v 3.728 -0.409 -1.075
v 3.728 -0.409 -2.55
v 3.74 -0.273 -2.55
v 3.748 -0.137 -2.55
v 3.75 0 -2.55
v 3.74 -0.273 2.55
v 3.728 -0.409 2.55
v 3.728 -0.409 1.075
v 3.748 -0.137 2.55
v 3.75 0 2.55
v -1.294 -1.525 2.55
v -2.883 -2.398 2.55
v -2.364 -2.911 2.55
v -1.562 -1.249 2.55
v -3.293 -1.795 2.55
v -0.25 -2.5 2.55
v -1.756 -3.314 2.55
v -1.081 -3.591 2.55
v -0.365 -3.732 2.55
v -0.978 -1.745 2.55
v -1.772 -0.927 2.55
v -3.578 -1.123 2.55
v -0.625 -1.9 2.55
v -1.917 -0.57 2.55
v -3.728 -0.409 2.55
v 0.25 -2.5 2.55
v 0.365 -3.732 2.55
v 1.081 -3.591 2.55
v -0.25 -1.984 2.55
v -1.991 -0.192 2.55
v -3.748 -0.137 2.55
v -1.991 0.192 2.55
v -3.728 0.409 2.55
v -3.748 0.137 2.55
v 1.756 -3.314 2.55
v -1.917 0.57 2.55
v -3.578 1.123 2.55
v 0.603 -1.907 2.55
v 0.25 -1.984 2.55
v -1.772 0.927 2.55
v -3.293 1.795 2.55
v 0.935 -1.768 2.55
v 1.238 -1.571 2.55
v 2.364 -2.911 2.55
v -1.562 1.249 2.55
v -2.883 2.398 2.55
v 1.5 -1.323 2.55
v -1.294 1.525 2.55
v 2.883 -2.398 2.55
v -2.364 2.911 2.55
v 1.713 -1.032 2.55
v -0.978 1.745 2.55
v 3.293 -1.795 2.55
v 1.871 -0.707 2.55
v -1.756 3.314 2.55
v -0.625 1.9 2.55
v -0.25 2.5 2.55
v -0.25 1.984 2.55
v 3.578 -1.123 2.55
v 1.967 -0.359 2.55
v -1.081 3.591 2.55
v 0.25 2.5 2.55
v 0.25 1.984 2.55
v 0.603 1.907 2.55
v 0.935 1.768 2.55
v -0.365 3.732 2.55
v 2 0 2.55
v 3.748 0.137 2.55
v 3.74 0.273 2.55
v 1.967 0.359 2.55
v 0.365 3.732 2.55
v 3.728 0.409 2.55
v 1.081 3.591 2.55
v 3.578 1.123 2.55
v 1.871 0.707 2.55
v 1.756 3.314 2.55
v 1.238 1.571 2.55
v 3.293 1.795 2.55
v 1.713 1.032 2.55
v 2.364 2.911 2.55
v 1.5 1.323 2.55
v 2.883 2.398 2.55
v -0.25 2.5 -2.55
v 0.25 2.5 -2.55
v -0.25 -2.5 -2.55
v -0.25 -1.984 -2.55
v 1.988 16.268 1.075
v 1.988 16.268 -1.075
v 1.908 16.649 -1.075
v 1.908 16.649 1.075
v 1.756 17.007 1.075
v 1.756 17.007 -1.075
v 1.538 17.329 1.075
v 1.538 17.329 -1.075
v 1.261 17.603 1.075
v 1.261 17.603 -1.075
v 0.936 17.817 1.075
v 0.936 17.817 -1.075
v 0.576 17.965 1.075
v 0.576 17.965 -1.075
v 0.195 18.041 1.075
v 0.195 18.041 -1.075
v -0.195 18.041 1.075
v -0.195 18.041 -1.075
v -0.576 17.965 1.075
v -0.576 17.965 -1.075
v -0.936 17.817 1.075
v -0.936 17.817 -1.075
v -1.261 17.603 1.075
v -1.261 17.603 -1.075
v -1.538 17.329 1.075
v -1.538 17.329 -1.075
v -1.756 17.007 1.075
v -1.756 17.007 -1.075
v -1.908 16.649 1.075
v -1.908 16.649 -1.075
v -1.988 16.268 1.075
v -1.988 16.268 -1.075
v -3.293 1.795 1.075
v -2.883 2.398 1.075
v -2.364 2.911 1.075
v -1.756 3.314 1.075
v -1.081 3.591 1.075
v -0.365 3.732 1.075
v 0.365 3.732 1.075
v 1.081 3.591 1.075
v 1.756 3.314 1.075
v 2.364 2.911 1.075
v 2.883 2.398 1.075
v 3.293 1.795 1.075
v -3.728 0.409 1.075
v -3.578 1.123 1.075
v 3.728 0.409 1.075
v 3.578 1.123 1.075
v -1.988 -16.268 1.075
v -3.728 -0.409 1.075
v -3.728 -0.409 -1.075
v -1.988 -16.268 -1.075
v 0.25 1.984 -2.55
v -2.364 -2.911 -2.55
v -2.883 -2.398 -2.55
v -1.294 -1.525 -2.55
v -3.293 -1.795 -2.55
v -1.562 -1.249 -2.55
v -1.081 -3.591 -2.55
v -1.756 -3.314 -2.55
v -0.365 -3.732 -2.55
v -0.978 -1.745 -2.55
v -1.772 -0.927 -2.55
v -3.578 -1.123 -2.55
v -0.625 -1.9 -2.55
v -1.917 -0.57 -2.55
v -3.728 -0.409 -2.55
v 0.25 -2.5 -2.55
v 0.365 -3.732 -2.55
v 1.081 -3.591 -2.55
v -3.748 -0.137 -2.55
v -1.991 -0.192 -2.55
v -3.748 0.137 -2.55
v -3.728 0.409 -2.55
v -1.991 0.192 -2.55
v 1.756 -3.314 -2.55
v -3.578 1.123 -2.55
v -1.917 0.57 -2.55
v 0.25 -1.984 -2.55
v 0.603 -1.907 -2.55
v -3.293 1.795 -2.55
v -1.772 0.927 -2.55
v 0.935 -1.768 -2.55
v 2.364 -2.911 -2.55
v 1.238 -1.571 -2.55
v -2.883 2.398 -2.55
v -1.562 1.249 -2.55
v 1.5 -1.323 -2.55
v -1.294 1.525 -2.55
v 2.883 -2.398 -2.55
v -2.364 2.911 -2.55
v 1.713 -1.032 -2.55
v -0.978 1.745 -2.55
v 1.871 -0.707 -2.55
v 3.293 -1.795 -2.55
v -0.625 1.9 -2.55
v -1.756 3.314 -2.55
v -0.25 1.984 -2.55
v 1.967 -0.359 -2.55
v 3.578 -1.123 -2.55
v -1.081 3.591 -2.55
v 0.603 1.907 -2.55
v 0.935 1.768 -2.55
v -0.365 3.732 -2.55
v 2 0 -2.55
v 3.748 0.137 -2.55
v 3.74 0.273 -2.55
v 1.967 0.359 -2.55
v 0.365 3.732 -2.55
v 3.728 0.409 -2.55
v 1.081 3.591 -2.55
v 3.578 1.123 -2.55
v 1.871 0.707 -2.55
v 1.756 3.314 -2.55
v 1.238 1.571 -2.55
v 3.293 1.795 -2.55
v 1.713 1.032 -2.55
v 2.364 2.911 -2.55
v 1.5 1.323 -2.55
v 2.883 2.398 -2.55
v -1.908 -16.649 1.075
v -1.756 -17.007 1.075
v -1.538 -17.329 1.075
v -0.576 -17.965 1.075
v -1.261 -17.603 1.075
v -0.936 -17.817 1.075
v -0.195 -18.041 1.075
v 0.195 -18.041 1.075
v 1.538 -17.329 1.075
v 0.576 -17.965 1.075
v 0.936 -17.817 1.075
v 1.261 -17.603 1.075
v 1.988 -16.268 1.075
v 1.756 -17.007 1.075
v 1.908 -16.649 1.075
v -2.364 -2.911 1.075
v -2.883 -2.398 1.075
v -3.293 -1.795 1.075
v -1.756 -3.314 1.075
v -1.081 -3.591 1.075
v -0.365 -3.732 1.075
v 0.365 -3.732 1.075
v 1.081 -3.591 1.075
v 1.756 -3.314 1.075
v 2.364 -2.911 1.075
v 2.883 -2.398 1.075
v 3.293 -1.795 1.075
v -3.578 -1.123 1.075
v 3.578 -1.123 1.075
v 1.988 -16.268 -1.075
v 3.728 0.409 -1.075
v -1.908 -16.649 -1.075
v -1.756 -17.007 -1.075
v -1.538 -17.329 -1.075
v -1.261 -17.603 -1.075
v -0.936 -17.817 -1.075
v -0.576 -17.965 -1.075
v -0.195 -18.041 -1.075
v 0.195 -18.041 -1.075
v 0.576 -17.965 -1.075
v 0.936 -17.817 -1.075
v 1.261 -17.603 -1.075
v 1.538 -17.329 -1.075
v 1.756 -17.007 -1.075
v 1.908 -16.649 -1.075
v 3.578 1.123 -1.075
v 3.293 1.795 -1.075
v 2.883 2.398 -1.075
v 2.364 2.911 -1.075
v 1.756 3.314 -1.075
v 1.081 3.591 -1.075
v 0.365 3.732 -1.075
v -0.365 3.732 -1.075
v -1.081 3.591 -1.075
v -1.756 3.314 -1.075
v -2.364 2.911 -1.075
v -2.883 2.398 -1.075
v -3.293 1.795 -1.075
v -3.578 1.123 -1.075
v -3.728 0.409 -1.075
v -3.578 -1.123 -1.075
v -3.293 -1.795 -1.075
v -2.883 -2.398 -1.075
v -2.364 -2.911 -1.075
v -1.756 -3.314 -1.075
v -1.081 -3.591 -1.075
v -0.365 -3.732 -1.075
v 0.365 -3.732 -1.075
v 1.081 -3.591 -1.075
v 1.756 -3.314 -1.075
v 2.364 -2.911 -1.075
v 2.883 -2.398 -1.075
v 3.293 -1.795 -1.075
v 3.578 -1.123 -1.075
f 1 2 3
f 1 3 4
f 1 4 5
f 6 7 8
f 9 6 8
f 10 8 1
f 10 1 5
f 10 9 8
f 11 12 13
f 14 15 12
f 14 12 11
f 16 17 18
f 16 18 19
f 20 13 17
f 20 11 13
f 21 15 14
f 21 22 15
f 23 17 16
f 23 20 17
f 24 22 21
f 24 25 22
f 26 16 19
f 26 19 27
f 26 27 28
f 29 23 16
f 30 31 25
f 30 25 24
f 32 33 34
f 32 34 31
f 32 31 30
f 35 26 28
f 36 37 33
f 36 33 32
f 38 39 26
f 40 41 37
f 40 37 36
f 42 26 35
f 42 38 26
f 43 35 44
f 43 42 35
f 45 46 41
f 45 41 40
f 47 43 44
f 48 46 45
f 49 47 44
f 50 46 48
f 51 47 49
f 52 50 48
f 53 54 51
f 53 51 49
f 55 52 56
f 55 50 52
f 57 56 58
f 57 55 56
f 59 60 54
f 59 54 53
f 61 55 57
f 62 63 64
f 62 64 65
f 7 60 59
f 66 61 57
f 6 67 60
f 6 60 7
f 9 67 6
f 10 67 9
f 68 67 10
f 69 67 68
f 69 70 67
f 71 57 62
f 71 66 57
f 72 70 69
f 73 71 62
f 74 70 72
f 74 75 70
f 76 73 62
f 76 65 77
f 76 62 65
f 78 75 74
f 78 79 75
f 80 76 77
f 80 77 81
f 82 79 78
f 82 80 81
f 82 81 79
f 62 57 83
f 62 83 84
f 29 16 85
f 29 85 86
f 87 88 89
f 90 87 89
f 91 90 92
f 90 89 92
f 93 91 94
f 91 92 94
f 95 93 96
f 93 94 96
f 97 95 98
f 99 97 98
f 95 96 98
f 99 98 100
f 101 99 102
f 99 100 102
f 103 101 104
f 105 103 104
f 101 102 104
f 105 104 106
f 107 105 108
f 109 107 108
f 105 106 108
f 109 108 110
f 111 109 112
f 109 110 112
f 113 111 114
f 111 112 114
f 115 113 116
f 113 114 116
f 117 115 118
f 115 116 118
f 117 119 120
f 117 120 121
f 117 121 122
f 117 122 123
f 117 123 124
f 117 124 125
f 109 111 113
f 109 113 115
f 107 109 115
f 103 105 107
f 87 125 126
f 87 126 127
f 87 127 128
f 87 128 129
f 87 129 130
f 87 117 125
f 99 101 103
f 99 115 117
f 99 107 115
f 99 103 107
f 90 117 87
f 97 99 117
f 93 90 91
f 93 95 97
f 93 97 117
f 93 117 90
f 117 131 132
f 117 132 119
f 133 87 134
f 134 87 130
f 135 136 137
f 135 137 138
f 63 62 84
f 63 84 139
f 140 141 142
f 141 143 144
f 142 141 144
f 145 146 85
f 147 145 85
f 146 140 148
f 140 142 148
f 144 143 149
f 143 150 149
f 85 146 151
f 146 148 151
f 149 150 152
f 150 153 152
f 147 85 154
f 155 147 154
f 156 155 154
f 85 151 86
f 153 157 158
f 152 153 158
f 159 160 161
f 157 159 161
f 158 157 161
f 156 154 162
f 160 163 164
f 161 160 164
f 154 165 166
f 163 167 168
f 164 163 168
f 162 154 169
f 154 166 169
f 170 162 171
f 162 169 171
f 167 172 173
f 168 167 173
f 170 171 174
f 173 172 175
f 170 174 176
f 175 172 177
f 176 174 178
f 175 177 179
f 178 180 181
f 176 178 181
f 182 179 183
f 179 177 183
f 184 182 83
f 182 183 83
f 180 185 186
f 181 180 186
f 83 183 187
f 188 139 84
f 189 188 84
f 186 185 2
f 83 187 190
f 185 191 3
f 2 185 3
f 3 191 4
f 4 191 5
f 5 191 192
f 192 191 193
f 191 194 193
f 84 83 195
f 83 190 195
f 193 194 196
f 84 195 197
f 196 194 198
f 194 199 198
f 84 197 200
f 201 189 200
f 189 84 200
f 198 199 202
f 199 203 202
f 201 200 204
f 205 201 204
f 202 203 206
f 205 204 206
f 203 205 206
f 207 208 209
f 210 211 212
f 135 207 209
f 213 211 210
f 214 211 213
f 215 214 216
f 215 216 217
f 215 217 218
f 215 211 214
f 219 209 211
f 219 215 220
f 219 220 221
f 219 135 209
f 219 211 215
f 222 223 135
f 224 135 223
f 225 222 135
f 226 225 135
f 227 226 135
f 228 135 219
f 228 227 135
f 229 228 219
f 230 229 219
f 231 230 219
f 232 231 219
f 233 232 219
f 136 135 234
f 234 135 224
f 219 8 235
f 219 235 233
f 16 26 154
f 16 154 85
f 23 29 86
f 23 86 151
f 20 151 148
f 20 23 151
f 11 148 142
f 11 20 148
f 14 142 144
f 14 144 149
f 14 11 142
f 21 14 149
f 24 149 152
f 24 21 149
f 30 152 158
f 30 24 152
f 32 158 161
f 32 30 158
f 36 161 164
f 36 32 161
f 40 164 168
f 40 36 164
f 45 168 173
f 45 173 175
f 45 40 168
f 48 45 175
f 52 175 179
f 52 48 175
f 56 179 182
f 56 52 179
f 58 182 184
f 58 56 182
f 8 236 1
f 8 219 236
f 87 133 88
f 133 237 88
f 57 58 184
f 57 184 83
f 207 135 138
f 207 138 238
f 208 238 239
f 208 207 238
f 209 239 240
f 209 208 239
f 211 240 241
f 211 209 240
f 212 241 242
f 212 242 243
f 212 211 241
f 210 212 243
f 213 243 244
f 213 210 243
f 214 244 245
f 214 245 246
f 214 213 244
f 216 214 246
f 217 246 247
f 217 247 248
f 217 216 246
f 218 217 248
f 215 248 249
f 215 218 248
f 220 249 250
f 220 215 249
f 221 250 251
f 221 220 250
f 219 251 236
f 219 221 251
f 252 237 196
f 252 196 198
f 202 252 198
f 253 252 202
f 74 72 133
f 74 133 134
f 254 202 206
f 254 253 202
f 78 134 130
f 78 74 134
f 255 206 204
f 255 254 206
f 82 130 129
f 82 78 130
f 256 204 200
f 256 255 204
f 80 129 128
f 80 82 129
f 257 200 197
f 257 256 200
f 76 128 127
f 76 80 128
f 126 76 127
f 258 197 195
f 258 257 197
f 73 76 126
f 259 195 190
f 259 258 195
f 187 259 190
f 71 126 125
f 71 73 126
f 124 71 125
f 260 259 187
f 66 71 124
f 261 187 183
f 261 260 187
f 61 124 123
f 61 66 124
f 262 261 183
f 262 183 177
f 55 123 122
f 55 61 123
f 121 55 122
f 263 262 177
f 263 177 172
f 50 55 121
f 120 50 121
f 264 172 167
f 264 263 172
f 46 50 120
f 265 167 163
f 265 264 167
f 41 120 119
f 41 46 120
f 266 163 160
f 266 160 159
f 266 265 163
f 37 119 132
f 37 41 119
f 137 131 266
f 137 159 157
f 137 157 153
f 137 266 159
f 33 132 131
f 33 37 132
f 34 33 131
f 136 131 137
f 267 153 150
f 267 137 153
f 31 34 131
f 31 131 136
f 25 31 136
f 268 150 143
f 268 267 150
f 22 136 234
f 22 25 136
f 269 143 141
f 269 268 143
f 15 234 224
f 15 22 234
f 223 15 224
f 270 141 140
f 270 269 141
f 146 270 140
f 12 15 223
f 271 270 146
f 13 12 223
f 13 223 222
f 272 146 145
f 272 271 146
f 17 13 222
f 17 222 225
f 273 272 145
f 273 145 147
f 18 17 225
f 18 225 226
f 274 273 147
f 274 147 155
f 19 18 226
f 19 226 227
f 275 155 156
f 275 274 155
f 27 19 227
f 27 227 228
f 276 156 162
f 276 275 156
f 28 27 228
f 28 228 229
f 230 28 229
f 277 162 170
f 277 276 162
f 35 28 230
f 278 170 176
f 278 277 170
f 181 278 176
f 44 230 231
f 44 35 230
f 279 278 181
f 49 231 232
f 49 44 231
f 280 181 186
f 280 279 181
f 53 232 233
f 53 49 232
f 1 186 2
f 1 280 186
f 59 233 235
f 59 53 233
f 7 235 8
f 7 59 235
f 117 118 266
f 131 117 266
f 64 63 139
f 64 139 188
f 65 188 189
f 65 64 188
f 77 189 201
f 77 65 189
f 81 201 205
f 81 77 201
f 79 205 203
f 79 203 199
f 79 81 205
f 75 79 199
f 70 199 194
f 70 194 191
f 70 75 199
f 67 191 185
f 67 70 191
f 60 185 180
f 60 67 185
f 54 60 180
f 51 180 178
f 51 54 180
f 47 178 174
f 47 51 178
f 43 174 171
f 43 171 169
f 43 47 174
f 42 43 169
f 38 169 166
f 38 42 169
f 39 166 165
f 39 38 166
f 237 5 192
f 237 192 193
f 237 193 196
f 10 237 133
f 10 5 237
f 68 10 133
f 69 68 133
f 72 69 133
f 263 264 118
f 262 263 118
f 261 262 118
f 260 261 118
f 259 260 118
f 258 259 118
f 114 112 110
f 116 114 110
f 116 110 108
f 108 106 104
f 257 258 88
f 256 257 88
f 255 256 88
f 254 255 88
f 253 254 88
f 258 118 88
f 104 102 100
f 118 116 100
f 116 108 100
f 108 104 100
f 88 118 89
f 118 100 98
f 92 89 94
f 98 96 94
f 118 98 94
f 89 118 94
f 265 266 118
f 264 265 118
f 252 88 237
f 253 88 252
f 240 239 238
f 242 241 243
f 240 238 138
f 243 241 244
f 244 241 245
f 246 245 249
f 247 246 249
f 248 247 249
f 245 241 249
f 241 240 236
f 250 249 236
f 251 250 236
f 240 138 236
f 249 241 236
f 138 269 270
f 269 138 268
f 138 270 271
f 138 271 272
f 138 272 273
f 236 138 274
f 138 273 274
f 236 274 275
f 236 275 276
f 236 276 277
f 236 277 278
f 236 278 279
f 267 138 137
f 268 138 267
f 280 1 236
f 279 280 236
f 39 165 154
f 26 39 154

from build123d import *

# Parameters (mm, degrees)
BOSS_EXTRUDE1_DEPTH = 2.55
BOSS_EXTRUDE2_DEPTH = 1.075


with BuildPart() as part:
    # Sketch1 → Boss-Extrude1 (new body, symmetric)
    with BuildSketch(Plane.XY):
        with BuildLine():
            ThreePointArc((3.727642468, 0.408878505), (0, 3.75), (-3.727642468, 0.408878505))
            ThreePointArc((-3.727642468, 0.408878505), (-3.75, 0), (-3.727642468, -0.408878505))
            ThreePointArc((-3.727642468, -0.408878505), (0, -3.75), (3.727642468, -0.408878505))
            ThreePointArc((3.727642468, -0.408878505), (3.744406445, -0.204744652), (3.75, 0))
            ThreePointArc((3.75, 0), (3.744406445, 0.204744652), (3.727642468, 0.408878505))
        make_face()
        with BuildLine():
            Line((0.25, -1.984313483), (0.25, -2.5))
            Line((0.25, -2.5), (-0.25, -2.5))
            Line((-0.25, -2.5), (-0.25, -1.984313483))
            ThreePointArc((-0.25, -1.984313483), (-2, 0), (-0.25, 1.984313483))
            Line((-0.25, 1.984313483), (-0.25, 2.5))
            Line((-0.25, 2.5), (0.25, 2.5))
            Line((0.25, 2.5), (0.25, 1.984313483))
            ThreePointArc((0.25, 1.984313483), (1.5, 1.322875656), (2, 0))
            ThreePointArc((2, 0), (1.5, -1.322875656), (0.25, -1.984313483))
        make_face(mode=Mode.SUBTRACT)
    extrude(amount=BOSS_EXTRUDE1_DEPTH, both=True)

    # Sketch2 → Boss-Extrude2 (add, symmetric)
    with BuildSketch(Plane.XY):
        with BuildLine():
            Line((-1.988075983, 16.268068536), (-3.727642468, 0.408878505))
            ThreePointArc((-3.727642468, 0.408878505), (0, 3.75), (3.727642468, 0.408878505))
            Line((3.727642468, 0.408878505), (1.988075983, 16.268068536))
            ThreePointArc((1.988075983, 16.268068536), (0, 18.05), (-1.988075983, 16.268068536))
        make_face()
        with BuildLine():
            ThreePointArc((3.727642468, -0.408878505), (0, -3.75), (-3.727642468, -0.408878505))
            Line((-3.727642468, -0.408878505), (-1.988075983, -16.268068536))
            ThreePointArc((-1.988075983, -16.268068536), (0, -18.05), (1.988075983, -16.268068536))
            Line((1.988075983, -16.268068536), (3.727642468, -0.408878505))
        make_face()
    extrude(amount=BOSS_EXTRUDE2_DEPTH, both=True)


solid = part.part
